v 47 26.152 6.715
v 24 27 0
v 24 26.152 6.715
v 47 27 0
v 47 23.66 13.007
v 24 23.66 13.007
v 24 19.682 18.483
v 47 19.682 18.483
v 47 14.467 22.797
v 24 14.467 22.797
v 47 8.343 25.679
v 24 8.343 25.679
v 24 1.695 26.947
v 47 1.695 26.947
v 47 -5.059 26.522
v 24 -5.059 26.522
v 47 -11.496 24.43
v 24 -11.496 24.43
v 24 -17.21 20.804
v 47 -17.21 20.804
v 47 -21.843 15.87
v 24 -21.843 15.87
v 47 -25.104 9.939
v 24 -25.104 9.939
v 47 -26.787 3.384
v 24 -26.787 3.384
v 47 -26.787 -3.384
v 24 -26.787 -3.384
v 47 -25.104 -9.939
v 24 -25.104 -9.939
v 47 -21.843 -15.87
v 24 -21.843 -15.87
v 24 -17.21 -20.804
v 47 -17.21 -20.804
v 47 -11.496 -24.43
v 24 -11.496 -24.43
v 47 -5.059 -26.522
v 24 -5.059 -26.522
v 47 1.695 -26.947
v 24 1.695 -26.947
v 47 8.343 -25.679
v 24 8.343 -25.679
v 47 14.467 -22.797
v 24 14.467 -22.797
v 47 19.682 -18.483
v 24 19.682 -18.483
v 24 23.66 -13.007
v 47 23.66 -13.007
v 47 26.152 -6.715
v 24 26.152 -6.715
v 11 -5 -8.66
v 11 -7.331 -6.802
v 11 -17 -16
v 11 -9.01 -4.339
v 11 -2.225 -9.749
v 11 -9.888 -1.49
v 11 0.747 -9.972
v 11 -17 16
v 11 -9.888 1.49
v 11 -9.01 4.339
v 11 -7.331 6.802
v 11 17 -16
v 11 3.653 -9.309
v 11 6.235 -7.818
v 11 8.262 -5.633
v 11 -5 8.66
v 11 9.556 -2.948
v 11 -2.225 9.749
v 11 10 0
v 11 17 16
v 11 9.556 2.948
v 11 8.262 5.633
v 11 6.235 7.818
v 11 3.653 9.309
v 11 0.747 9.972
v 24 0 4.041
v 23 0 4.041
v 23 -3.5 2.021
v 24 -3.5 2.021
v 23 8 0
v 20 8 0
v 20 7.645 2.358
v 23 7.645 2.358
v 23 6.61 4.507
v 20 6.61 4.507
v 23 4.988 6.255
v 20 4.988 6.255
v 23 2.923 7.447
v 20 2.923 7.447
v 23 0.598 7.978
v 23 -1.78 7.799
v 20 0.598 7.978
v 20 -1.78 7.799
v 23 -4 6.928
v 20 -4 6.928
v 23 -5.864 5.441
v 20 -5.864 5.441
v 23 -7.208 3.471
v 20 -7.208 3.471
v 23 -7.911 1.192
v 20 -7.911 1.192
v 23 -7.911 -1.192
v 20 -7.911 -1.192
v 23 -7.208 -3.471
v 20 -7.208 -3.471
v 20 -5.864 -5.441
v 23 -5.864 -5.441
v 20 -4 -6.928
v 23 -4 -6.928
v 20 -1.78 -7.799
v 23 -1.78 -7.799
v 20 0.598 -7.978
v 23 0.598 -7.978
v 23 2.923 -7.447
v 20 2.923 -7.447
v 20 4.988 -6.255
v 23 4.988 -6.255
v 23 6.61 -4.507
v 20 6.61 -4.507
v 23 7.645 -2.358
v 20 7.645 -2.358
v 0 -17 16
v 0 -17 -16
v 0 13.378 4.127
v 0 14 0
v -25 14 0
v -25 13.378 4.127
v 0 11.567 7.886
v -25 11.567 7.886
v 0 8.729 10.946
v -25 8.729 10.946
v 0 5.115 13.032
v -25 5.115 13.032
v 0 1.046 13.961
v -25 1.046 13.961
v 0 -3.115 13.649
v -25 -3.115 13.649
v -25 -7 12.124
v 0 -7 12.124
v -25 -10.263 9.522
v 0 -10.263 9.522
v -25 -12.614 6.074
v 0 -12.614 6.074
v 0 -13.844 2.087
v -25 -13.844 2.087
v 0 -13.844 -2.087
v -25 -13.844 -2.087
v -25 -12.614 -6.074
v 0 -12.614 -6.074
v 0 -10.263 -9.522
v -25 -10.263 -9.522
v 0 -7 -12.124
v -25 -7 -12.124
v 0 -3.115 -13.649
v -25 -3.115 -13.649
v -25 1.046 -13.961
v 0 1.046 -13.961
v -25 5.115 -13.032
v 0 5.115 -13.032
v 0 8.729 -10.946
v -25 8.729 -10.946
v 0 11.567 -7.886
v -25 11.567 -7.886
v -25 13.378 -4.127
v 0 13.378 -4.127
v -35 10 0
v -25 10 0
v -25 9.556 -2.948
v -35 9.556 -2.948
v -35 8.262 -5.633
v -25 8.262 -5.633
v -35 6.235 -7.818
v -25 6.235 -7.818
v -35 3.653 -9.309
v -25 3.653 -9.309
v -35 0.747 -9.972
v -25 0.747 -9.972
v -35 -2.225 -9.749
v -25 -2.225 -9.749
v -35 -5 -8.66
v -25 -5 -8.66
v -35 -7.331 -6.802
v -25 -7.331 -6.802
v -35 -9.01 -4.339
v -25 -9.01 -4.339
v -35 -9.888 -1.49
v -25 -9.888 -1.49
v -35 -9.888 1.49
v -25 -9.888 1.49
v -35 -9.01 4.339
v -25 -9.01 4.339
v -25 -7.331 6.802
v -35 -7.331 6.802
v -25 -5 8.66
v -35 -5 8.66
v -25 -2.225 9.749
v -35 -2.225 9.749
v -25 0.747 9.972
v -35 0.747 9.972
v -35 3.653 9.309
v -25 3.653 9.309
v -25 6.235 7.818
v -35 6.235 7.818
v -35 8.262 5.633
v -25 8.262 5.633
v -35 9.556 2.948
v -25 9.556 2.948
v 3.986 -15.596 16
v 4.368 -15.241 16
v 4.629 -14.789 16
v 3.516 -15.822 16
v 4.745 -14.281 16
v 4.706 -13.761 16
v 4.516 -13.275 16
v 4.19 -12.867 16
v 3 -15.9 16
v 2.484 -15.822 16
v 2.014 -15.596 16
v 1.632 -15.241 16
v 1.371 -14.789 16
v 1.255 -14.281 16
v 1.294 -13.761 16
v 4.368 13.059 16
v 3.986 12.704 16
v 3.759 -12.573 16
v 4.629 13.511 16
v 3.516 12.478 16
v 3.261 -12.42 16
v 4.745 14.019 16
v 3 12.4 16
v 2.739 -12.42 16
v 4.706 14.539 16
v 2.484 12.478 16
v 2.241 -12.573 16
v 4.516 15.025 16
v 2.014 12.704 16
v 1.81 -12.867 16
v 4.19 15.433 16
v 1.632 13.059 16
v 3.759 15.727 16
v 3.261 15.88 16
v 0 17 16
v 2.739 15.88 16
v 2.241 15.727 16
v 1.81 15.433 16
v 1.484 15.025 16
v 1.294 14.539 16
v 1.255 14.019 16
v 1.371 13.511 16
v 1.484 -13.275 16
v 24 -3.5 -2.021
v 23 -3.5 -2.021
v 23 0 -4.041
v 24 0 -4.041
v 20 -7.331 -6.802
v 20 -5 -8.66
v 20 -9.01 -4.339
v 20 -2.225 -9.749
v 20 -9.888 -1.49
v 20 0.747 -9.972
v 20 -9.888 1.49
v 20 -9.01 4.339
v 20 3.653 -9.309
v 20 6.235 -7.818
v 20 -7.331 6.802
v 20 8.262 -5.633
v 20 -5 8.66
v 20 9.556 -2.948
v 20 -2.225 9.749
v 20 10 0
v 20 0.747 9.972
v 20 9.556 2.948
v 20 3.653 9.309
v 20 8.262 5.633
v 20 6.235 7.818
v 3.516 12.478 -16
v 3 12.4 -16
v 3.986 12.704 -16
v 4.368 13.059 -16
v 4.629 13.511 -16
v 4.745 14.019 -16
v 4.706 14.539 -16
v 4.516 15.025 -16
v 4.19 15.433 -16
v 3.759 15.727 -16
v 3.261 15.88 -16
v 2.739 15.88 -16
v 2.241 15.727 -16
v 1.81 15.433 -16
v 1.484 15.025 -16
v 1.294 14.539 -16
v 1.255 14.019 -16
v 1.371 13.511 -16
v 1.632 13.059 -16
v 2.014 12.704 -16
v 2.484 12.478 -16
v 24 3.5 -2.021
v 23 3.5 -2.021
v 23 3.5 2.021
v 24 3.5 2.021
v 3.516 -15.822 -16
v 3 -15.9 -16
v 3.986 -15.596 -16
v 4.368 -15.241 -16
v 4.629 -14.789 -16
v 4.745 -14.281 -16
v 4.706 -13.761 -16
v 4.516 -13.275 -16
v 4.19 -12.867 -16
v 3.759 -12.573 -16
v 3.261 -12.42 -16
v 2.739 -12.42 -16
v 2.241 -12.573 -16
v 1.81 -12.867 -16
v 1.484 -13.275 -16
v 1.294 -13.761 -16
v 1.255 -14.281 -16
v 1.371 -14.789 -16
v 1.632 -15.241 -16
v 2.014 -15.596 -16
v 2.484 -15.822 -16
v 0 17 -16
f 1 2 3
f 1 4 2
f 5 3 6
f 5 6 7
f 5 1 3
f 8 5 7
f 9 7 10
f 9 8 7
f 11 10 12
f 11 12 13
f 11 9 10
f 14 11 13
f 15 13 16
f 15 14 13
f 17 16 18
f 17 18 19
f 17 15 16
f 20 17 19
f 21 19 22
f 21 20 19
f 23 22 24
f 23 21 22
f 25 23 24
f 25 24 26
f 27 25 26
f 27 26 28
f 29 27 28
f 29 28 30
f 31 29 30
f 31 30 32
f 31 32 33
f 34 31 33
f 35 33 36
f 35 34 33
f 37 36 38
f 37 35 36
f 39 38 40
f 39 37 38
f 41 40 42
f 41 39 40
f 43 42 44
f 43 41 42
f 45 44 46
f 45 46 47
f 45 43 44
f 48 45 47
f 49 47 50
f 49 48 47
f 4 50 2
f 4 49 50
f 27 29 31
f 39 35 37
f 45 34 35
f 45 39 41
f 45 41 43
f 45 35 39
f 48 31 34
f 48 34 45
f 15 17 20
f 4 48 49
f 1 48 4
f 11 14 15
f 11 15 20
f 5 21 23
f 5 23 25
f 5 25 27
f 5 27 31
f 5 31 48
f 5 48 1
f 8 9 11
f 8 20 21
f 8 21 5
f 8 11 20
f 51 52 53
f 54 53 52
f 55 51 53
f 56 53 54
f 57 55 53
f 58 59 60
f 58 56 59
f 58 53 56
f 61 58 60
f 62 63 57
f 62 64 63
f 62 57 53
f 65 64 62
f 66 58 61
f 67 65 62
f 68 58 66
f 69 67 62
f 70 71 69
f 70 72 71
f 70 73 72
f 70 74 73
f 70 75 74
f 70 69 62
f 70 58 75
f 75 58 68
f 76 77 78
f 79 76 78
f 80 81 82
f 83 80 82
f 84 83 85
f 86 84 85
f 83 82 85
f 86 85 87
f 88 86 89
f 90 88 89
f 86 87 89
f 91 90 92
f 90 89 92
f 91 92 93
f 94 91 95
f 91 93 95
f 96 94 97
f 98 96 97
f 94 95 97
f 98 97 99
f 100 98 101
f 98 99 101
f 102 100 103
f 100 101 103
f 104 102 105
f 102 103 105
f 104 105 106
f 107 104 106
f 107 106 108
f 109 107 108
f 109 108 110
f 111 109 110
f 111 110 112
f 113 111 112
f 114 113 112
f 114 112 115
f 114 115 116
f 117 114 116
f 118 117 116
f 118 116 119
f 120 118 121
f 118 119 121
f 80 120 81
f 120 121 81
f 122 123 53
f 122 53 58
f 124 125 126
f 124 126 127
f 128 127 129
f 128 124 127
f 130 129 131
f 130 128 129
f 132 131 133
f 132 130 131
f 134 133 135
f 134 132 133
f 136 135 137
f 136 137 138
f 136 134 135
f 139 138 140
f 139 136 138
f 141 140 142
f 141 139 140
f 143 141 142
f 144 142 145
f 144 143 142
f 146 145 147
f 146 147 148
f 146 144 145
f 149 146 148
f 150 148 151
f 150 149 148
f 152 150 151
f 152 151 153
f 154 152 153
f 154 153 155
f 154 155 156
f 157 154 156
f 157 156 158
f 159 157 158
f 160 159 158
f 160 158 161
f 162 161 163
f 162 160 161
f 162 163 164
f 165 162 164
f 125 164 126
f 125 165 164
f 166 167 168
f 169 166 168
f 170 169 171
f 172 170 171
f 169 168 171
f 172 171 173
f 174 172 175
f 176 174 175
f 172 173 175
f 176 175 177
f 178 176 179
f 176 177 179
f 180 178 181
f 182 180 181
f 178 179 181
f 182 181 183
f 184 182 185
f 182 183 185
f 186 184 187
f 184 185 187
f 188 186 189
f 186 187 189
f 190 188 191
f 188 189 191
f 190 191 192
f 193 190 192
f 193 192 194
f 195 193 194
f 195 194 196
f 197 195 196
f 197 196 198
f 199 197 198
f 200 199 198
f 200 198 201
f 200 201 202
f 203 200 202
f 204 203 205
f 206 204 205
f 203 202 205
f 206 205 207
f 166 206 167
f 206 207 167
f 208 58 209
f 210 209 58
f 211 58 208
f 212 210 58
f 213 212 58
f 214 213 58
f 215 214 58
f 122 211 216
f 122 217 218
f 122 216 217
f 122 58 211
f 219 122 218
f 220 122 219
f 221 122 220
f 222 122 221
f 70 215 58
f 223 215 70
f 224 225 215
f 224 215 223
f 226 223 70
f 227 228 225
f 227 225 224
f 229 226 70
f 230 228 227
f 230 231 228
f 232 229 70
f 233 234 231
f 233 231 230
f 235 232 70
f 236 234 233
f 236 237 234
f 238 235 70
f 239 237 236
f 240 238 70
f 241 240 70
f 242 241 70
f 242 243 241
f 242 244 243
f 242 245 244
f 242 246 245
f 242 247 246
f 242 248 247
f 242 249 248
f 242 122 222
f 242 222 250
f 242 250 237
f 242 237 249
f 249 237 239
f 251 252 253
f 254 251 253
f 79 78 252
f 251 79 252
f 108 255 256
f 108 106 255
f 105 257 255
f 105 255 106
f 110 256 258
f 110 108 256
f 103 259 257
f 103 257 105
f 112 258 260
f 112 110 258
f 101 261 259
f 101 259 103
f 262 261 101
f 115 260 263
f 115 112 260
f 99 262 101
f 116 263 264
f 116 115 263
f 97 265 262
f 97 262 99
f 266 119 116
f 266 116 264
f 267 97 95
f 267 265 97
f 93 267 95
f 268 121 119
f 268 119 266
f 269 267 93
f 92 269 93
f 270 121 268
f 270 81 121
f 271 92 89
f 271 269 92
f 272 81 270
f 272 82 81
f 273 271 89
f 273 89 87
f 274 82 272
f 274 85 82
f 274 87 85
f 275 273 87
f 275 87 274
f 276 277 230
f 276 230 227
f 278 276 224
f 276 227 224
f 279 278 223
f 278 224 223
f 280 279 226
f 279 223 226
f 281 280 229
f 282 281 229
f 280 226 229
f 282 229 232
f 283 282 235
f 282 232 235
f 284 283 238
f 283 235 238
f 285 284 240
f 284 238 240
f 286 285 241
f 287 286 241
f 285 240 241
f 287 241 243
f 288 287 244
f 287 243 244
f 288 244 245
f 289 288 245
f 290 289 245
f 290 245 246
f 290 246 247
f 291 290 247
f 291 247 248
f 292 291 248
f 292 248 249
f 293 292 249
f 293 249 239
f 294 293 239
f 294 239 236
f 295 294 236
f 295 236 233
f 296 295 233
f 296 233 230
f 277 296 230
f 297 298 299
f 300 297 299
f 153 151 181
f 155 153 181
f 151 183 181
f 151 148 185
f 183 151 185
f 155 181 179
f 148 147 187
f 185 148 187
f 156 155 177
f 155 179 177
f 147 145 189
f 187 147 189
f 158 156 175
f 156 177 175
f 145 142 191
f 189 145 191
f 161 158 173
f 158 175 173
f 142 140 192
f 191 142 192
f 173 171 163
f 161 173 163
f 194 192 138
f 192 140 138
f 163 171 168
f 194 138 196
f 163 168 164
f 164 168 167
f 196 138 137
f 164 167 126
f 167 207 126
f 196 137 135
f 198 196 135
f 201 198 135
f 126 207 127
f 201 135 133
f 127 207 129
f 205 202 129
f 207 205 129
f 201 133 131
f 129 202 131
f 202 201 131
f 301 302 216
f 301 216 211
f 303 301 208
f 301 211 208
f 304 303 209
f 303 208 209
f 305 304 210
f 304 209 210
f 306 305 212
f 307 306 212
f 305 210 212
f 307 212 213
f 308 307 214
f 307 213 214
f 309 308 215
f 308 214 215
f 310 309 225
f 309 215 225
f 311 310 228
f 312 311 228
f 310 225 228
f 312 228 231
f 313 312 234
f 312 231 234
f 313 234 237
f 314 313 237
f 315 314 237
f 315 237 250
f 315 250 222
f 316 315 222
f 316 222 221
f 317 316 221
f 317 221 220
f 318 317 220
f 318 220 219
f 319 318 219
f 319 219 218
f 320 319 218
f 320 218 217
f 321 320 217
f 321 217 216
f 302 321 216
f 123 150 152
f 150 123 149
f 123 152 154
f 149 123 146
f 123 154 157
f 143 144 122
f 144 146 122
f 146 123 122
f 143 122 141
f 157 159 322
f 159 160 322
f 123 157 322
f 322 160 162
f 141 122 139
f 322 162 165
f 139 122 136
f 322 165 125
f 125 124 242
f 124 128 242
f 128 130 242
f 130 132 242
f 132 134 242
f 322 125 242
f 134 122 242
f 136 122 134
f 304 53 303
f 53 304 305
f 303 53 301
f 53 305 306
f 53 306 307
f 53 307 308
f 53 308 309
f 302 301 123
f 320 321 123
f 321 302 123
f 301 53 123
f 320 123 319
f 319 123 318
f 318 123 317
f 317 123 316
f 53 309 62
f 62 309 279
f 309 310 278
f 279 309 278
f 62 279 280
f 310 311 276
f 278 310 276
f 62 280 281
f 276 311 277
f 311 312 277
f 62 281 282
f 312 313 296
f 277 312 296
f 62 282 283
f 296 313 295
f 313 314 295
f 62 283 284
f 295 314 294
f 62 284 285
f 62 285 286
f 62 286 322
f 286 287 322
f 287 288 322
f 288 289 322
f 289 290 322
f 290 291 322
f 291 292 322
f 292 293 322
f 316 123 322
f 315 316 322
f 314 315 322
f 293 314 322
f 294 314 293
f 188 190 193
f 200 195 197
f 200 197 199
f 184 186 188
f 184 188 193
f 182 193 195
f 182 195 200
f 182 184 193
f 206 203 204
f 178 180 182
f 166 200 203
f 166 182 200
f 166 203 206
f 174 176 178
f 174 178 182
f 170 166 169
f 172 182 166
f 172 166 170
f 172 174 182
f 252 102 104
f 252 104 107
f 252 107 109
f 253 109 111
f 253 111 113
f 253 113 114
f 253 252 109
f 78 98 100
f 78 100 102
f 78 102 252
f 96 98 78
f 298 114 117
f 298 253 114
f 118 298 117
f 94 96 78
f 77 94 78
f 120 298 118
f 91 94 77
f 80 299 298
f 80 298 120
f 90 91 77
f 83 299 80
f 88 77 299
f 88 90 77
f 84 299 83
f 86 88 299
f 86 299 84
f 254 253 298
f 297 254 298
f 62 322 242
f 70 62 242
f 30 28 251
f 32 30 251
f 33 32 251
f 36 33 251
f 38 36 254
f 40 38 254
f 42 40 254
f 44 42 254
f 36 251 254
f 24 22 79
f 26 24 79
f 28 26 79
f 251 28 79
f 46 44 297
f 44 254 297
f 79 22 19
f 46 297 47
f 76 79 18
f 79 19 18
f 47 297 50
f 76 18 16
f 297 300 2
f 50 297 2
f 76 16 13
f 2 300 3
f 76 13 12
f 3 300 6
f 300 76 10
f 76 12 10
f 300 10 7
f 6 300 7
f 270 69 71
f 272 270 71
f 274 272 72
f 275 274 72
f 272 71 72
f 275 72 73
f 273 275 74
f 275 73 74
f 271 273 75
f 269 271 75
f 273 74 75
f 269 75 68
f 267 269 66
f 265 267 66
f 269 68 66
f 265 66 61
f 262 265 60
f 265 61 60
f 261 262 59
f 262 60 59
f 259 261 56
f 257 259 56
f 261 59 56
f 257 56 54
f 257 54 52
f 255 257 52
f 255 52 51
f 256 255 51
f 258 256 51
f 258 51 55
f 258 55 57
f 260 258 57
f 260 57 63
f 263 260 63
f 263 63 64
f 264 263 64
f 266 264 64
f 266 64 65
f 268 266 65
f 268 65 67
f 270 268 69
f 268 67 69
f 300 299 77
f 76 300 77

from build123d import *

# Parameters (mm, degrees)
SKETCH_R          = 14
PAD_DEPTH         = 25
SKETCH001_W       = 34
SKETCH001_H       = 32
PAD001_DEPTH      = 11
SKETCH002_R       = 10
PAD002_DEPTH      = 9
SKETCH003_R       = 8
PAD003_DEPTH      = 3
PAD004_DEPTH      = 12
SKETCH005_R       = 1.75
POCKET_DEPTH      = 100
SKETCH006_R       = 27
PAD005_DEPTH      = 12
PAD005_DEPTH_BACK = 11
SKETCH007_R       = 10
PAD006_DEPTH      = 10


with BuildPart() as part:
    # Sketch → Pad (new body)
    with BuildSketch(Plane.YZ):
        Circle(SKETCH_R)
    extrude(amount=-PAD_DEPTH)

    # Sketch001 (on Face2 of Pad) → Pad001 (join)
    with BuildSketch(Plane.YZ):
        Rectangle(SKETCH001_W, SKETCH001_H)
    extrude(amount=PAD001_DEPTH)

    # Sketch002 (on Face5 of Pad001) → Pad002 (join)
    with BuildSketch(Plane.YZ.offset(11)):
        Circle(SKETCH002_R)
    extrude(amount=PAD002_DEPTH)

    # Sketch003 (on Face10 of Pad002) → Pad003 (join)
    with BuildSketch(Plane.YZ.offset(20)):
        Circle(SKETCH003_R)
    extrude(amount=PAD003_DEPTH)

    # Sketch004 (on Face12 of Pad003) → Pad004 (join)
    with BuildSketch(Plane.YZ.offset(23)):
        Polygon((0, 4.041452), (-3.5, 2.020726), (-3.5, -2.020726), (0, -4.041452), (3.5, -2.020726), (3.5, 2.020726), align=None)
    extrude(amount=PAD004_DEPTH)

    # Sketch005 (on Face1 of Pad004) → Pocket (cut)
    with BuildSketch(Plane(origin=(0, 0, 16), x_dir=(0, -1, 0), z_dir=(0, 0, 1))):
        with Locations((-14.15, 3)):
            Circle(SKETCH005_R)
        with Locations((14.15, 3)):
            Circle(SKETCH005_R)
    extrude(amount=-POCKET_DEPTH, mode=Mode.SUBTRACT)

    # Sketch006 (on Face21 of Pocket) → Pad005 (join, two sides)
    with BuildSketch(Plane.YZ.offset(35)) as pad005_sk:
        Circle(SKETCH006_R)
    extrude(amount=PAD005_DEPTH)
    extrude(pad005_sk.sketch, amount=-PAD005_DEPTH_BACK)

    # Sketch007 (on Face11 of Pad005) → Pad006 (join)
    with BuildSketch(Plane(origin=(-25, 0, 0), x_dir=(0, 1, 0), z_dir=(-1, 0, 0))):
        Circle(SKETCH007_R)
    extrude(amount=PAD006_DEPTH)


solid = part.part
